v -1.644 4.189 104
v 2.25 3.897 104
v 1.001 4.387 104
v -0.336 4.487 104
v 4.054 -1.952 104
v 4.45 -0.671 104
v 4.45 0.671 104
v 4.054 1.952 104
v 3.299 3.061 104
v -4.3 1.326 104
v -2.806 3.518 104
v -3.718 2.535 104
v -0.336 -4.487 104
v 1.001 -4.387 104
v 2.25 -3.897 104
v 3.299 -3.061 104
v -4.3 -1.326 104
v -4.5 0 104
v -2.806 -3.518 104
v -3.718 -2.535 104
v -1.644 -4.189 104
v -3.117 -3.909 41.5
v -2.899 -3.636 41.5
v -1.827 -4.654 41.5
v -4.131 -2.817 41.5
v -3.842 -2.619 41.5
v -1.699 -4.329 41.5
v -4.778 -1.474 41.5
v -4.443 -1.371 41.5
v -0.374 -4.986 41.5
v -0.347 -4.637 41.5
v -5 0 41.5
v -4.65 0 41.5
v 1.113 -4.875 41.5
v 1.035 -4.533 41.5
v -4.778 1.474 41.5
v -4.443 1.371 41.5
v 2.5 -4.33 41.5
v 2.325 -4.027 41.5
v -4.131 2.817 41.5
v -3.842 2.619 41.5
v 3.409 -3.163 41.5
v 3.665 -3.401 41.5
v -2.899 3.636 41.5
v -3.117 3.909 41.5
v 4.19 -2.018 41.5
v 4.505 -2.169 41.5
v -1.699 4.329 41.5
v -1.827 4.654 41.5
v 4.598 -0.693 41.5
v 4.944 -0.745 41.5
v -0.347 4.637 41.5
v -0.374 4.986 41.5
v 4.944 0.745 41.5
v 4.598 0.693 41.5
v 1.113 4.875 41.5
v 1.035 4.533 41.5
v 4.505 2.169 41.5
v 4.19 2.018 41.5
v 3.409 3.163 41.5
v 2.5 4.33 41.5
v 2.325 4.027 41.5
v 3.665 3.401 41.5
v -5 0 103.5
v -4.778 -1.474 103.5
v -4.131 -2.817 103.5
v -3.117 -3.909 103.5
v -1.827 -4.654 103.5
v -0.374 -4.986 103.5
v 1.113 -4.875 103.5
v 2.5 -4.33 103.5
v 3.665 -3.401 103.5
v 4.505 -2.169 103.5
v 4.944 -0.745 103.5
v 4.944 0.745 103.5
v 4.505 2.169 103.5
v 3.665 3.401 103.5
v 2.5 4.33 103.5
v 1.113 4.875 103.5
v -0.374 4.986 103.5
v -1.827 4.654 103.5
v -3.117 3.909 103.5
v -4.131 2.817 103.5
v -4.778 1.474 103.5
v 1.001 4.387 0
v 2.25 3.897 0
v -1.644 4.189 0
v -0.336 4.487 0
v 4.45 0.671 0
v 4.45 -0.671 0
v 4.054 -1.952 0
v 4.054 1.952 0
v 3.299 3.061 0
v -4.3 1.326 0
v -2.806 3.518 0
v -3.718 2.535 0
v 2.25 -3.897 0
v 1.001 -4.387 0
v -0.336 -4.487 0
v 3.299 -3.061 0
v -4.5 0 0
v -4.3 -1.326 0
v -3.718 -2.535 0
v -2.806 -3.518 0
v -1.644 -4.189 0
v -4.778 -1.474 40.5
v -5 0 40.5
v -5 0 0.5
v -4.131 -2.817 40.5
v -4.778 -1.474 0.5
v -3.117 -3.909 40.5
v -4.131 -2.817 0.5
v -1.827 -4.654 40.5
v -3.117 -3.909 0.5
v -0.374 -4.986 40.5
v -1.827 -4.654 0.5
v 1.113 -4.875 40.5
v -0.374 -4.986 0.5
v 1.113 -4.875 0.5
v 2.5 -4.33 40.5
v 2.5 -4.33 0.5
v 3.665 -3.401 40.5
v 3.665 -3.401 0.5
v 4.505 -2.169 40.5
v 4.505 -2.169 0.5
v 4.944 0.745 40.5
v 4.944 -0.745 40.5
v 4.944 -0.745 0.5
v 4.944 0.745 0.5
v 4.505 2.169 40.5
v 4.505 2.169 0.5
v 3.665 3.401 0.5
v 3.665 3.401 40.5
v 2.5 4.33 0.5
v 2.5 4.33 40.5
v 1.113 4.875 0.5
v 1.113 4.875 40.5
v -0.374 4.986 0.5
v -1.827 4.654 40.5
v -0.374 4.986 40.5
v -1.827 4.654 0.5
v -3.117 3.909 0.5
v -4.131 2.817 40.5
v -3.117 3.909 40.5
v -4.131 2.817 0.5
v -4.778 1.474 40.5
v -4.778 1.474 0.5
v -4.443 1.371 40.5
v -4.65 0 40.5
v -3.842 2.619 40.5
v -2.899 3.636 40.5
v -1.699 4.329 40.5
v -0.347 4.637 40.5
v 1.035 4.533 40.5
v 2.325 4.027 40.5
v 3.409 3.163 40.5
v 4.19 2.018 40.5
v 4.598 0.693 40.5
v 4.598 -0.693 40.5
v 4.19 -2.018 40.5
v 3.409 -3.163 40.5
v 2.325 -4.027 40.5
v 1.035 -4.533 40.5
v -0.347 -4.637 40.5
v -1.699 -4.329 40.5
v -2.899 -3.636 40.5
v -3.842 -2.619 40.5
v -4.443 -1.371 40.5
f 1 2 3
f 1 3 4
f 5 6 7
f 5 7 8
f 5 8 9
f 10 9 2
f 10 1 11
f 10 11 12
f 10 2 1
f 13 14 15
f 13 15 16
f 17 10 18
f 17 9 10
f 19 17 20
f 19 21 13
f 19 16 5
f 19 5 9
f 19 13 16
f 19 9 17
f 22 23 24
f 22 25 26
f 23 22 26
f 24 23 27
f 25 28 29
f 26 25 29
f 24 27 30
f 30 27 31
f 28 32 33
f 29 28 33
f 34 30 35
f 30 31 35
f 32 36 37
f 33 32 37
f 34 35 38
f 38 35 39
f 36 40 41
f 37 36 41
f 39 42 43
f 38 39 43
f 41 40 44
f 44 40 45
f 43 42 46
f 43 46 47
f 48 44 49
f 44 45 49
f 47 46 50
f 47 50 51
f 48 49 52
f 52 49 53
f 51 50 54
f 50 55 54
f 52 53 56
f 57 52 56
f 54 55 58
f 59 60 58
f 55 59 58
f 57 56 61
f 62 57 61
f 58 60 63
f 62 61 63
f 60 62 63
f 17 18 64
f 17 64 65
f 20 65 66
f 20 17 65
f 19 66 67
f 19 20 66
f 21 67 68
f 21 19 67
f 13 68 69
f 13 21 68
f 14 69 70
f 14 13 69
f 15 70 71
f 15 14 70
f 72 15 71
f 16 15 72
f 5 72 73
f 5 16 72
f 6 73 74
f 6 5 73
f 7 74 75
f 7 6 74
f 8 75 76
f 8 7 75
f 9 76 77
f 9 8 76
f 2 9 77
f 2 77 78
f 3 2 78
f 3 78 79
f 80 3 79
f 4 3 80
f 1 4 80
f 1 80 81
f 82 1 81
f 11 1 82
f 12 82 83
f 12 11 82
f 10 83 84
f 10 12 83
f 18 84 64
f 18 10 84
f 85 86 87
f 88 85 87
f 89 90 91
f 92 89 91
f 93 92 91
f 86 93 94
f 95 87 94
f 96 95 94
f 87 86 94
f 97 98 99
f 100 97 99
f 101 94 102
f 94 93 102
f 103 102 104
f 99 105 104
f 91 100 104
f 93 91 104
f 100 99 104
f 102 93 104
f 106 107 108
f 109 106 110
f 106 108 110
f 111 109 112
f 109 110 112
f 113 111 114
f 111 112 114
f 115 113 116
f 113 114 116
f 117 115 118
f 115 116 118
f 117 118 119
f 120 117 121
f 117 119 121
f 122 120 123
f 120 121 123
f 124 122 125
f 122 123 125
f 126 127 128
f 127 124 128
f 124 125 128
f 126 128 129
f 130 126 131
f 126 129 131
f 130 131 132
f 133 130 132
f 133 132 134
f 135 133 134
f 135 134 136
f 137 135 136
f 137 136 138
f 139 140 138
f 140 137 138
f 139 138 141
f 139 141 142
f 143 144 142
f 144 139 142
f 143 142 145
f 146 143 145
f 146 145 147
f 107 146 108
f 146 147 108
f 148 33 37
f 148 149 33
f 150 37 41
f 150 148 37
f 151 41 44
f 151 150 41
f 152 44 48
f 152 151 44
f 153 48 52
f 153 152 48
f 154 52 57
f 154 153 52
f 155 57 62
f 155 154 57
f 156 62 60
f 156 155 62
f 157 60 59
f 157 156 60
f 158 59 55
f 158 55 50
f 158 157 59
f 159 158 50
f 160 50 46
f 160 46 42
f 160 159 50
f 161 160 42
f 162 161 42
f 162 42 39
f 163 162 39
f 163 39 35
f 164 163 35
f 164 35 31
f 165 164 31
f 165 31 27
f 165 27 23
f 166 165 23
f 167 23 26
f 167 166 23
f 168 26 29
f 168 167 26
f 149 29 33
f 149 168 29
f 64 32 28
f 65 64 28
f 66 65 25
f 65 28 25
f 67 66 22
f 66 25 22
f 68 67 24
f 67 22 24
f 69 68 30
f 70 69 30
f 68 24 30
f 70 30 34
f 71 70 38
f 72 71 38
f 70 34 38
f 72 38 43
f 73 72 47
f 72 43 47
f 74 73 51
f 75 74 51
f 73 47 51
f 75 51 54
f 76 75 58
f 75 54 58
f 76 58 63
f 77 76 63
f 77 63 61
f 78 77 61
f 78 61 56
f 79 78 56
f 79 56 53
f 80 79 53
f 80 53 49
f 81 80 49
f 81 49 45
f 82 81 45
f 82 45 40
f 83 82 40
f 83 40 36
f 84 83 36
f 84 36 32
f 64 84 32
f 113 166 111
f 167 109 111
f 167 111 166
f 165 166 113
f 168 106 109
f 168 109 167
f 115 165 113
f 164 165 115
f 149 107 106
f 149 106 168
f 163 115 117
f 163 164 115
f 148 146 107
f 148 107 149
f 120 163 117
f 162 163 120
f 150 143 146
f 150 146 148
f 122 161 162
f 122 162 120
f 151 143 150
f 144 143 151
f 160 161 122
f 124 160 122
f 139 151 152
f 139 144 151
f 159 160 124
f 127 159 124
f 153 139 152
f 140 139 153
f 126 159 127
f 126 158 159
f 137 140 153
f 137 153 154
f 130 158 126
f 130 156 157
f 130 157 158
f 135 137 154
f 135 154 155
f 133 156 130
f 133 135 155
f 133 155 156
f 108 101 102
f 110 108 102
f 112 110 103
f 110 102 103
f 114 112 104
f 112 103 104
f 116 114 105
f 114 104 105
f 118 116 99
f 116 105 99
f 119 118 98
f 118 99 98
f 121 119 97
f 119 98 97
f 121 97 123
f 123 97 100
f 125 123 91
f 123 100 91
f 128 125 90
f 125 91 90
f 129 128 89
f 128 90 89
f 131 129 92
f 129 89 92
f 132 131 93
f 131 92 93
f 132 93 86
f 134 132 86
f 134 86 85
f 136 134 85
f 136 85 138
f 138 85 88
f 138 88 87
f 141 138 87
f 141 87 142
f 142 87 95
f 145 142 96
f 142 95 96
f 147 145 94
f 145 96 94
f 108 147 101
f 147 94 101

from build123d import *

# Parameters (mm, degrees)
SKETCH_1_R      = 5
EXTRUDE_1_DEPTH = 104
SKETCH_2_W      = 3.498862739
SKETCH_2_H      = 1
CHAMFER_1_SIZE  = 0.5


with BuildPart() as part:
    # 草图1 → 拉伸1 (new body)
    with BuildSketch(Plane.XY):
        with Locations(Location((0, 0, 0), (0, 0, 180))):
            Circle(SKETCH_1_R)
    extrude(amount=EXTRUDE_1_DEPTH)

    # 草图2 → 切除-旋转1 (revolve, cut)
    with BuildSketch(Plane(origin=(0, 0, 0), x_dir=(1, 0, 0), z_dir=(0, 1, 0)), mode=Mode.PRIVATE) as cut_revolve_1_sk:
        with Locations((6.39943137, -41)):
            Rectangle(SKETCH_2_W, SKETCH_2_H)
    revolve(cut_revolve_1_sk.sketch.rotate(Axis((0, 0, 104), (0, 0, -1)), 180), axis=Axis((0, 0, 104), (0, 0, -1)), mode=Mode.SUBTRACT)

    # 倒角1
    chamfer_1_edges = [part.edges().sort_by_distance(p)[0] for p in [
        (5, 0, 0),
        (5, 0, 104),
    ]]
    chamfer(chamfer_1_edges, length=CHAMFER_1_SIZE)


solid = part.part
